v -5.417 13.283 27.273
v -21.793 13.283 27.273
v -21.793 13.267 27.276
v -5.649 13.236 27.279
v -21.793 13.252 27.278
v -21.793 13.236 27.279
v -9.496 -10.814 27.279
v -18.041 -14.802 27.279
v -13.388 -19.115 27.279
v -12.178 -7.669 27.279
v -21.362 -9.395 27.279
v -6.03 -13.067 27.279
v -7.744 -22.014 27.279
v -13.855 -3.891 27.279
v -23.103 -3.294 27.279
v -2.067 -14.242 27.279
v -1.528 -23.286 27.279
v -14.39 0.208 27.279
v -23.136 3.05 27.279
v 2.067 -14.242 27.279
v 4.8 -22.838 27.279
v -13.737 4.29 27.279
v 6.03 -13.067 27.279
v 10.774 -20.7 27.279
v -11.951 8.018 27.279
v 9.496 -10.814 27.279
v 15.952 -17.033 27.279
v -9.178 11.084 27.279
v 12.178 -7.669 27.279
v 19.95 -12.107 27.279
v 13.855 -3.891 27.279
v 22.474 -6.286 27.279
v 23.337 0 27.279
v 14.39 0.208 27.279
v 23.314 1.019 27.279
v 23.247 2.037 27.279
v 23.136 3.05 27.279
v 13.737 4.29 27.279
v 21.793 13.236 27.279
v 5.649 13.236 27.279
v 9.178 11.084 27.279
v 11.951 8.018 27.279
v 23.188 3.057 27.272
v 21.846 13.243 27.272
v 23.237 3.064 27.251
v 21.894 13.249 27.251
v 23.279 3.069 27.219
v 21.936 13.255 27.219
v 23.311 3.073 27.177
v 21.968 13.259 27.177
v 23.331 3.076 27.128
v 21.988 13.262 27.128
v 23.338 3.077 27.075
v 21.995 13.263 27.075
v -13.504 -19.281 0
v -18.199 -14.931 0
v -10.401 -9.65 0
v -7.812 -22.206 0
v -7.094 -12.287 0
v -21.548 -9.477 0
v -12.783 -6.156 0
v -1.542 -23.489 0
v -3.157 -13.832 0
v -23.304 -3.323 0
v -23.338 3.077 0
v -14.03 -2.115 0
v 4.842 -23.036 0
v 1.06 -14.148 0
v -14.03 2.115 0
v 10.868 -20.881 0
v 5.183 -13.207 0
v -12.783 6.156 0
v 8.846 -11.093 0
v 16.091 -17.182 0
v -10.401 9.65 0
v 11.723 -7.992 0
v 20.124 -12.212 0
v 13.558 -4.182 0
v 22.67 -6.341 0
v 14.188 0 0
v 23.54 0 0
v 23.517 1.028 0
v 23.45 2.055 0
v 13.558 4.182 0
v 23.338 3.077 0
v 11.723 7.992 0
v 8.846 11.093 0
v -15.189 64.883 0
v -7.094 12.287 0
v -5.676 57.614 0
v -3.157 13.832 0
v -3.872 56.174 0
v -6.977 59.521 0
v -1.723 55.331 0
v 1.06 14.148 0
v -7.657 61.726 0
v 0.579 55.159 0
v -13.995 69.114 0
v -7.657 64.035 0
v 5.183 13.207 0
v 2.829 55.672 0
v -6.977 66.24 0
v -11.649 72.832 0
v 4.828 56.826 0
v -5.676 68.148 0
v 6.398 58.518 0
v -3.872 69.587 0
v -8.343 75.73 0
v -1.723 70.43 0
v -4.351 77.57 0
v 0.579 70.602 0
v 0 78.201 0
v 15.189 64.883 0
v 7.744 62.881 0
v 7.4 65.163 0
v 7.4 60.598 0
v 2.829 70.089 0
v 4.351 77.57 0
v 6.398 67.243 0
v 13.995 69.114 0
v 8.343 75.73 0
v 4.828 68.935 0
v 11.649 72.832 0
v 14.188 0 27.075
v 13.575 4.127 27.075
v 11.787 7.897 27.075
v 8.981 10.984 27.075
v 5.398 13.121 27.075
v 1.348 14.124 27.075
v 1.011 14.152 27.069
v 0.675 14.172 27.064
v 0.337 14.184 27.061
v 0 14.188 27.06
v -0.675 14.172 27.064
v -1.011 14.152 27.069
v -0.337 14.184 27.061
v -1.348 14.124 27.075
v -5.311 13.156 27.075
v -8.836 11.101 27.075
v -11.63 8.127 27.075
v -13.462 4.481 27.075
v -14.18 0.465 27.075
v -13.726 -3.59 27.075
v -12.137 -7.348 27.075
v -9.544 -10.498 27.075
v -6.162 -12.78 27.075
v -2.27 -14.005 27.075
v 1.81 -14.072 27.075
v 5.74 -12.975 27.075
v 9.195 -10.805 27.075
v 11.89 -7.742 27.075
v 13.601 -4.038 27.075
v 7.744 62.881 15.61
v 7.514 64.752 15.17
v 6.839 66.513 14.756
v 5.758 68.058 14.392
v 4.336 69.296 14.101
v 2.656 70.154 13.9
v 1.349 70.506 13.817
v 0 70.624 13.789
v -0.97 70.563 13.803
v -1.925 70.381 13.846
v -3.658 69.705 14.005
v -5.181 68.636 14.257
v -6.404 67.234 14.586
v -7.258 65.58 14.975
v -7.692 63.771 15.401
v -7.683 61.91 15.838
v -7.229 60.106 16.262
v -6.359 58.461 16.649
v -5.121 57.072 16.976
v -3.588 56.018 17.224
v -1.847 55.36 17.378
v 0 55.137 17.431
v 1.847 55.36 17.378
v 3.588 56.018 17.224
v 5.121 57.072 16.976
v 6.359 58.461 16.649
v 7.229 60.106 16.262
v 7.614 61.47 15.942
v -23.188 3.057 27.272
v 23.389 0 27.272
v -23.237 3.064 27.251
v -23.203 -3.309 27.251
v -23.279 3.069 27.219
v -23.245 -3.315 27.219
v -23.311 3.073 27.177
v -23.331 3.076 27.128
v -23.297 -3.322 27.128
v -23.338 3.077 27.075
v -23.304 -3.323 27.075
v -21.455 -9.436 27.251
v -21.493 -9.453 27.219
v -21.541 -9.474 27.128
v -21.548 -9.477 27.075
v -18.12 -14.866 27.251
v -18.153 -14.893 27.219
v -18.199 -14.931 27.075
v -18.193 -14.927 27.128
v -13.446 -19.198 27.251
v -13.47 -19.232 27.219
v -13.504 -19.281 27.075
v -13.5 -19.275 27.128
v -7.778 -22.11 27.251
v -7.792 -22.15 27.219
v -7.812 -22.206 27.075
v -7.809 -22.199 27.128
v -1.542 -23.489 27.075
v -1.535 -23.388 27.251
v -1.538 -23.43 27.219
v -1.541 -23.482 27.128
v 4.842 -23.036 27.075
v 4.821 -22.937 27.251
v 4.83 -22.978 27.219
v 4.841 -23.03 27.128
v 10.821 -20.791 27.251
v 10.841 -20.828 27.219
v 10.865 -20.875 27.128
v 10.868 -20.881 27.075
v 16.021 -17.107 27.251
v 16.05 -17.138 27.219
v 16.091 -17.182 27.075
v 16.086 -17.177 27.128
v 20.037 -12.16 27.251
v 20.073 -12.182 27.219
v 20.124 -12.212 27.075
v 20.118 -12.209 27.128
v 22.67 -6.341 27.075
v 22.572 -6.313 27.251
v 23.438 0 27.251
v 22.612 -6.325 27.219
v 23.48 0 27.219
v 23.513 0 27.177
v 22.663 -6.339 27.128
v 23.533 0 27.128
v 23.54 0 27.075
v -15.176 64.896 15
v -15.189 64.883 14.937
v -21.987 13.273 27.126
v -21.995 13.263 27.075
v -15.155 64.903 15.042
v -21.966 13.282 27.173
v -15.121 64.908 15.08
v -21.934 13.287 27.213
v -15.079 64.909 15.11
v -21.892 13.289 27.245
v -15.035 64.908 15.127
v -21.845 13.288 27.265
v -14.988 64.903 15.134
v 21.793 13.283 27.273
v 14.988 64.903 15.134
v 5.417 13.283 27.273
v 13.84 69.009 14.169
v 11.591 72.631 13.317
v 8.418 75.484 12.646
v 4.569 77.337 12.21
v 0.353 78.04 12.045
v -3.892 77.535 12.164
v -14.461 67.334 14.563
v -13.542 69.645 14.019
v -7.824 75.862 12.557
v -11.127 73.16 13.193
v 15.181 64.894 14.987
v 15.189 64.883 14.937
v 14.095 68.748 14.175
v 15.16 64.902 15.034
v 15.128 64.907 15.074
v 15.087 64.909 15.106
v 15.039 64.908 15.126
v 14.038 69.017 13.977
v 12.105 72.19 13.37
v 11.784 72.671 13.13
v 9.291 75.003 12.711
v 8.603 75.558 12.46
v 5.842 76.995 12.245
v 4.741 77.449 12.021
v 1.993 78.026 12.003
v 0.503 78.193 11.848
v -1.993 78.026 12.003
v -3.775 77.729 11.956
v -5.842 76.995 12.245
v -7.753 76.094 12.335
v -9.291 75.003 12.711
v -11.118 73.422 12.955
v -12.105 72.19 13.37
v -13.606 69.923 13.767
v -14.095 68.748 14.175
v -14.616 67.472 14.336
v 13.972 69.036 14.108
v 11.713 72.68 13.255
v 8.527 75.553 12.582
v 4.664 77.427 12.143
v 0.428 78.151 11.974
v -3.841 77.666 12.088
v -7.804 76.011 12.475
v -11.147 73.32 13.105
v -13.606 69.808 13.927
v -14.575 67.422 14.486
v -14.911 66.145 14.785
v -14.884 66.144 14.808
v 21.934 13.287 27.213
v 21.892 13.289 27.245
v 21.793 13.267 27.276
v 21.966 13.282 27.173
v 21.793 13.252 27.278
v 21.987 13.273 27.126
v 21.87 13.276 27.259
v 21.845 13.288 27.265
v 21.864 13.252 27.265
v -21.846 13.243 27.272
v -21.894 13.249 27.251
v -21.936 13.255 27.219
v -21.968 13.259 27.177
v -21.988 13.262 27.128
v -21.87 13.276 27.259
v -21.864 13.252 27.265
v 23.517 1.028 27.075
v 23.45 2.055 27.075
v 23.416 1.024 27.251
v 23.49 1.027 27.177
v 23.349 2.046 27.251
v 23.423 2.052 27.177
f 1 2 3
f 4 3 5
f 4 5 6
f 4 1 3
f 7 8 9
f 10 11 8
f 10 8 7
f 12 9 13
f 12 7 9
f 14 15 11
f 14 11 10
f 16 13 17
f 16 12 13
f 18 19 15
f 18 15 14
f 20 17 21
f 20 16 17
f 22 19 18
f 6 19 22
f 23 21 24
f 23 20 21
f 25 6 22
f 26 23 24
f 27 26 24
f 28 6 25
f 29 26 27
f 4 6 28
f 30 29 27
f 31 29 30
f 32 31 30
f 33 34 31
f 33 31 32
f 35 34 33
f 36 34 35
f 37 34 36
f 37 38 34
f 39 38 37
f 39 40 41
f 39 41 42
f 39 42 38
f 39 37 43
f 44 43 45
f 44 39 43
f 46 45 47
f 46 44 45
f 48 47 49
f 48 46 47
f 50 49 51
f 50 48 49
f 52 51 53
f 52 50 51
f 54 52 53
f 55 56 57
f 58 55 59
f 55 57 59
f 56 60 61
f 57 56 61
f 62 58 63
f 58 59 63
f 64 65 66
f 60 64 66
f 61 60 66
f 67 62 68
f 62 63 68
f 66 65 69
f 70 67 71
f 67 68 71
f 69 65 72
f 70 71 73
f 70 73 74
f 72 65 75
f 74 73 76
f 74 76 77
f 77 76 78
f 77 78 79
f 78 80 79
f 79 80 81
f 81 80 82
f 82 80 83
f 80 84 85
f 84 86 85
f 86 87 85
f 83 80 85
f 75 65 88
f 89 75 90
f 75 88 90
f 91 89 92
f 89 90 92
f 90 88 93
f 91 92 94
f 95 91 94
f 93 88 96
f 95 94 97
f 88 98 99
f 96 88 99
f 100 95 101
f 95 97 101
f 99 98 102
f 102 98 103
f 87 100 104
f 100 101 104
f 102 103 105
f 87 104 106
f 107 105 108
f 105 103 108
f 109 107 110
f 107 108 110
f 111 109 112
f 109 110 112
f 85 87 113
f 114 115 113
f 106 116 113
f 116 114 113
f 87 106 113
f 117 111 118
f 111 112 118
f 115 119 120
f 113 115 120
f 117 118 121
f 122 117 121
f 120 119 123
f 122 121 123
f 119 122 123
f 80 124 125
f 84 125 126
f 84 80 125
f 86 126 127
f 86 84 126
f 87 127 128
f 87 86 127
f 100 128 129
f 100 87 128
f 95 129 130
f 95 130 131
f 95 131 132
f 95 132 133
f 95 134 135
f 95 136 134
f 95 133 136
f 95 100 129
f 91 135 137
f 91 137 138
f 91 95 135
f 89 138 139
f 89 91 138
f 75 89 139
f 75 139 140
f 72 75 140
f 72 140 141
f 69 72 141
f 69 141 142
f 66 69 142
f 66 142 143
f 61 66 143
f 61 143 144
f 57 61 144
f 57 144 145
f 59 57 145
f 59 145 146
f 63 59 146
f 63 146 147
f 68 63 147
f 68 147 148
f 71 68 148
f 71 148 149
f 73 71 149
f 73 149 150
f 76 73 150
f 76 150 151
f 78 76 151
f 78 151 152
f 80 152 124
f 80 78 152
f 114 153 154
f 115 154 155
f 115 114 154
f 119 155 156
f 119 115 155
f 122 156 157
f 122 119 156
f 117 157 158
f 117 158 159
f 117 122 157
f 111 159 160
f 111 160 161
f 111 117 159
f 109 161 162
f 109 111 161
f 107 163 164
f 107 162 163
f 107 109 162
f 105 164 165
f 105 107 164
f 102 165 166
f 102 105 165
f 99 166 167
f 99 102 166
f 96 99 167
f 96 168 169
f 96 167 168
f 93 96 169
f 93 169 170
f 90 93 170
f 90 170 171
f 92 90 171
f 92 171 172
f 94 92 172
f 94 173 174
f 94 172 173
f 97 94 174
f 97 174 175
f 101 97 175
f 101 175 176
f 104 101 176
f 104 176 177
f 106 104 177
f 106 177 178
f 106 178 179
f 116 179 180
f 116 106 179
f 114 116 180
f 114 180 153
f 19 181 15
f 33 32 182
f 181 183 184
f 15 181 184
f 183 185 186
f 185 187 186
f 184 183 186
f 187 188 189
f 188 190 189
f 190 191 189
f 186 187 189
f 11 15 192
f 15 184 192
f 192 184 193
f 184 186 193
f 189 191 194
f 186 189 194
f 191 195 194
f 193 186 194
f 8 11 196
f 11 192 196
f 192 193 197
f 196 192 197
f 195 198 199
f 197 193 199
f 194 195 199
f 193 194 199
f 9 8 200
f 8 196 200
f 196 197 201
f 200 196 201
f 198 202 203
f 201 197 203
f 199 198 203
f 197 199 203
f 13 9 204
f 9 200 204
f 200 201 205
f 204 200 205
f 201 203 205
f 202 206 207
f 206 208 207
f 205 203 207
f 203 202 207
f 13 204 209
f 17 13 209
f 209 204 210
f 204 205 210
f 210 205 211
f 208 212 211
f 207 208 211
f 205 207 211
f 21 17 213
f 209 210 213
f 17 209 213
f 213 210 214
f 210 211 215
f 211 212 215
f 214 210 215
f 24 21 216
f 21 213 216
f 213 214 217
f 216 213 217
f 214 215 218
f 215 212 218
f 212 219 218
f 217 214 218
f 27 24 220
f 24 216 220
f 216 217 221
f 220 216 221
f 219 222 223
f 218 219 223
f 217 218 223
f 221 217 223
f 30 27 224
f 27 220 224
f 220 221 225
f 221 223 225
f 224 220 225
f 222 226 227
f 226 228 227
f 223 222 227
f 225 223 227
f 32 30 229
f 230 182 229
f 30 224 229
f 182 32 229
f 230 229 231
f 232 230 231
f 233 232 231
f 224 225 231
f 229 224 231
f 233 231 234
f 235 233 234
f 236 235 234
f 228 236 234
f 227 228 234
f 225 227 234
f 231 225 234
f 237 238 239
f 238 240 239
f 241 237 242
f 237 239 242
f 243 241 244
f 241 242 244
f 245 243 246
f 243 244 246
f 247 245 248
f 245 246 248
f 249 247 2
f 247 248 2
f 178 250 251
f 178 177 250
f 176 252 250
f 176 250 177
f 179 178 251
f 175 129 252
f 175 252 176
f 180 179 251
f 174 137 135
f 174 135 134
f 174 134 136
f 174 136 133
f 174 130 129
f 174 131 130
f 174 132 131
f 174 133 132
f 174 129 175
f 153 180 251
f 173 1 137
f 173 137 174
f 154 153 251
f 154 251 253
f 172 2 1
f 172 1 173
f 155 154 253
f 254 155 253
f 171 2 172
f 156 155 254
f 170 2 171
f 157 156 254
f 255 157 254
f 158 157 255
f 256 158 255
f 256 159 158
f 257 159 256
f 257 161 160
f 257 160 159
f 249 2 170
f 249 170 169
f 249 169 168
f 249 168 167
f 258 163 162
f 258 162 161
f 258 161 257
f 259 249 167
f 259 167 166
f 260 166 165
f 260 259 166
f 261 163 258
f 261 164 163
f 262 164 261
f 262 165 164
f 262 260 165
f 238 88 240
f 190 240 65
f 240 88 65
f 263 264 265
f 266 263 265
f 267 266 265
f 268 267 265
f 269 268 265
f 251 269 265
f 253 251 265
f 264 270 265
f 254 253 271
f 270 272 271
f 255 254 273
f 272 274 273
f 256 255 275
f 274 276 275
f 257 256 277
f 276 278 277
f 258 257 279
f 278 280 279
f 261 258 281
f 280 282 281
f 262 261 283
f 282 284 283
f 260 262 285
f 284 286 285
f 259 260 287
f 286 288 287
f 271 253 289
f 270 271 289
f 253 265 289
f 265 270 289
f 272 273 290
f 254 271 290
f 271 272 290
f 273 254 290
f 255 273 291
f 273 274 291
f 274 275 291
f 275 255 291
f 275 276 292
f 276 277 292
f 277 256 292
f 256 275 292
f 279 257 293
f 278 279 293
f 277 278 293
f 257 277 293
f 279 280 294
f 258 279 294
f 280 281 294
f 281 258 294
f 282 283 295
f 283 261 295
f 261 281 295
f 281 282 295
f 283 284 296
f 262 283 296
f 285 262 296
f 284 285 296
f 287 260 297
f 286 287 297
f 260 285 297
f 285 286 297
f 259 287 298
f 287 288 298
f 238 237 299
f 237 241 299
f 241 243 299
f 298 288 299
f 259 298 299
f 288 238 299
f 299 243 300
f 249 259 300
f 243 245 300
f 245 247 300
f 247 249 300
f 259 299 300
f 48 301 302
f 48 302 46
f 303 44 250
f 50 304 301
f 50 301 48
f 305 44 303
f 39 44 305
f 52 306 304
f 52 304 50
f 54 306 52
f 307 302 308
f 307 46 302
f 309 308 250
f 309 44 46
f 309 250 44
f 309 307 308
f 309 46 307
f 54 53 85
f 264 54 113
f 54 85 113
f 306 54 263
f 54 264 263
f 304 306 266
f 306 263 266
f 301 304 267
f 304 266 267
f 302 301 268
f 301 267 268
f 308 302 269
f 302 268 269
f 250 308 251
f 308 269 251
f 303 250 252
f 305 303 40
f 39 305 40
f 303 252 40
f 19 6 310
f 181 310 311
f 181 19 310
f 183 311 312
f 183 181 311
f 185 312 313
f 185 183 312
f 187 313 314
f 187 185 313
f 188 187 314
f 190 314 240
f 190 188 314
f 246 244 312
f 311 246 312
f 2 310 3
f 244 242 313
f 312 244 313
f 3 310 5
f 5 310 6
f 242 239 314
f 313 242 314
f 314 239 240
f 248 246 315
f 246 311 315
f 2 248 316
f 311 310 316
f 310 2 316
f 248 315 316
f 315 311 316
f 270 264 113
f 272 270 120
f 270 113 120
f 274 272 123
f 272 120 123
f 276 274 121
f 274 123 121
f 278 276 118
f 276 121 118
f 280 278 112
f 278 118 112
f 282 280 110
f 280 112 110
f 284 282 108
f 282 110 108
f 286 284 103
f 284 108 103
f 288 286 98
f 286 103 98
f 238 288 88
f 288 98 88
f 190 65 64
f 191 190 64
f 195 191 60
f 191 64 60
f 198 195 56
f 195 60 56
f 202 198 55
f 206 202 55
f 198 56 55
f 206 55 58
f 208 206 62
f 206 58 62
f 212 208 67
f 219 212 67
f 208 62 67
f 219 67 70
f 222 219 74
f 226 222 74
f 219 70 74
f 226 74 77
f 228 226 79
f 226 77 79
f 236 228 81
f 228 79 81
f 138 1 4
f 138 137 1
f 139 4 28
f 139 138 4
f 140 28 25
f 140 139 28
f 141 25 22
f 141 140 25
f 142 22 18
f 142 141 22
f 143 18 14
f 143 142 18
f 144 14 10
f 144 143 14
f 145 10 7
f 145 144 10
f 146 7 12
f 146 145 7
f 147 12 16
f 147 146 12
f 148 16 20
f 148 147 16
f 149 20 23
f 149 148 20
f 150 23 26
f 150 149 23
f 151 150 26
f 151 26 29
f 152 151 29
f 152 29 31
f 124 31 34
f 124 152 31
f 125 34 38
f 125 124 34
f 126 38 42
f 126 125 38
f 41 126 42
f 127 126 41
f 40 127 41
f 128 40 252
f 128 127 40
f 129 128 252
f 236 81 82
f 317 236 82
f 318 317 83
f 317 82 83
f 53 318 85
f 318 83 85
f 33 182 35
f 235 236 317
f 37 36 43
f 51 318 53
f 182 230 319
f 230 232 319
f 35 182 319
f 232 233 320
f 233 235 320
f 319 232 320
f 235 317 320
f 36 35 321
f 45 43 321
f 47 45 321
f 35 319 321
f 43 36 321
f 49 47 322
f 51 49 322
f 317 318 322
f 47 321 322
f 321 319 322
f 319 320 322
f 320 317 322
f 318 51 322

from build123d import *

# Parameters (mm, degrees)
F0_R          = 14.187969
F0_R_2        = 7.743586
F1_DEPTH      = 27.278503
F4_DEPTH      = 70.82668
F4_DEPTH_BACK = 25.4
F5_R          = 0.2032


with BuildPart() as f1:
    # F0 (on Top) → F1 (new body)
    with BuildSketch(Plane.XY):
        with BuildLine():
            ThreePointArc((-23.337792, 3.076938), (0, 23.539755), (23.337792, 3.076938))
            Line((23.337792, 3.076938), (15.189044, 64.883116))
            ThreePointArc((15.189044, 64.883116), (15.287592, 63.883982), (15.320488, 62.880538))
            ThreePointArc((15.320488, 62.880538), (-1.003444, 47.592947), (-15.189044, 64.883116))
            Line((-15.189044, 64.883116), (-23.337792, 3.076938))
        make_face()
        with BuildLine():
            ThreePointArc((-23.337792, 3.076938), (-1.54178, -23.48921), (23.539755, 0))
            ThreePointArc((23.539755, 0), (23.48921, 1.54178), (23.337792, 3.076938))
            ThreePointArc((23.337792, 3.076938), (0, 23.539755), (-23.337792, 3.076938))
        make_face()
        Circle(F0_R, mode=Mode.SUBTRACT)
        with BuildLine():
            ThreePointArc((15.320488, 62.880538), (15.287592, 63.883982), (15.189044, 64.883116))
            ThreePointArc((15.189044, 64.883116), (0, 78.201027), (-15.189044, 64.883116))
            ThreePointArc((-15.189044, 64.883116), (-1.003444, 47.592947), (15.320488, 62.880538))
        make_face()
        with Locations((0, 62.880538)):
            Circle(F0_R_2, mode=Mode.SUBTRACT)
    extrude(amount=F1_DEPTH)

    # F3 (on Right) → F4 (cut, two sides)
    with BuildSketch(Plane.YZ) as f4_sk:
        Polygon((98.717824, 27.551521), (12.098692, 27.551521), (98.717824, 7.182653), align=None)
    extrude(amount=F4_DEPTH, mode=Mode.SUBTRACT)
    extrude(f4_sk.sketch, amount=-F4_DEPTH_BACK, mode=Mode.SUBTRACT)

    # F5
    f5_edges = [f1.edges().sort_by_distance(p)[0] for p in [
        (-8.052412, -11.681487, 27.278503),
        (-1.54178, -23.48921, 27.278503),
        (18.592151, 39.071411, 21.208768),
        (-13.521451, 13.259705, 27.278503),
        (13.521451, 13.259705, 27.278503),
    ]]
    fillet(f5_edges, radius=F5_R)


solid = f1.part
